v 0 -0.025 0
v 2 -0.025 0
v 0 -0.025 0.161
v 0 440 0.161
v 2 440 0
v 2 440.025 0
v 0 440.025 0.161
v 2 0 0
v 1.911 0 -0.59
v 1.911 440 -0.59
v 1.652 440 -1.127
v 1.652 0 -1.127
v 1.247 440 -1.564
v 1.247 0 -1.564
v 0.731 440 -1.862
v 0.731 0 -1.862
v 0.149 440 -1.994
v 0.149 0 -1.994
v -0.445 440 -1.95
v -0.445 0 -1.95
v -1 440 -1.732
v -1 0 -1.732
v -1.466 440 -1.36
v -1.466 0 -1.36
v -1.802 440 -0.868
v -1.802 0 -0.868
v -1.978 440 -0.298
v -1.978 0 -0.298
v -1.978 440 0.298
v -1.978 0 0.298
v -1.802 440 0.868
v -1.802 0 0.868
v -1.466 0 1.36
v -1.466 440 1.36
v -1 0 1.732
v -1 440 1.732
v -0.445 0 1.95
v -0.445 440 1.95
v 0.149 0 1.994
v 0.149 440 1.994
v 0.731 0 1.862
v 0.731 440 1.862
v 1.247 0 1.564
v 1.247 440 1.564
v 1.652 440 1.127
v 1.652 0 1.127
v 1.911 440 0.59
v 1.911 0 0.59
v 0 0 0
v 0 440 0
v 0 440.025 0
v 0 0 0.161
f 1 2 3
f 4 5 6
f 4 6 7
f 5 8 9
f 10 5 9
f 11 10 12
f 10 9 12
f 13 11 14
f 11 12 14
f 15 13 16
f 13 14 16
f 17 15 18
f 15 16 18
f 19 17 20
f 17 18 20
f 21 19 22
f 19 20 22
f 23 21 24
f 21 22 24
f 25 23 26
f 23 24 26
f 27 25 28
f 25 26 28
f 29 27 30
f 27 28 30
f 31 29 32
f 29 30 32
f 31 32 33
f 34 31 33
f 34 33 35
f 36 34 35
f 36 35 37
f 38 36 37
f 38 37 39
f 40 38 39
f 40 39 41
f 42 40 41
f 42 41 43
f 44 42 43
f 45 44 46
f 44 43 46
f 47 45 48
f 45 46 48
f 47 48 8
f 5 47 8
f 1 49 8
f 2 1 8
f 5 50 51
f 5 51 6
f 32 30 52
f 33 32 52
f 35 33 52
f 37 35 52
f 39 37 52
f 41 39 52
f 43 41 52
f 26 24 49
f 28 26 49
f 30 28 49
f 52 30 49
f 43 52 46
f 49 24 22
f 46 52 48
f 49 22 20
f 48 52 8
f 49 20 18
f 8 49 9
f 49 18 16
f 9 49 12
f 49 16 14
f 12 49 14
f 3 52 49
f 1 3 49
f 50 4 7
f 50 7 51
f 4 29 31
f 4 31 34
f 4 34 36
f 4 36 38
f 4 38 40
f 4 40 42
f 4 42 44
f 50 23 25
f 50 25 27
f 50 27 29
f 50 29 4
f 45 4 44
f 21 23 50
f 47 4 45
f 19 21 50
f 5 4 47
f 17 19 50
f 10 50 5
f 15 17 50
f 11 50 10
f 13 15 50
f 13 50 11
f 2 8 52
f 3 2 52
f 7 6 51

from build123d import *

# Parameters (mm, degrees)
SKETCH1_R           = 2
BOSS_EXTRUDE1_DEPTH = 440.000000112
BOSS_EXTRUDE2_DEPTH = 0.0254


with BuildPart() as part:
    # Sketch1 → Boss-Extrude1 (new body)
    with BuildSketch(Plane(origin=(0, 0, 0), x_dir=(1, 0, 0), z_dir=(0, 1, 0))):
        Circle(SKETCH1_R)
    extrude(amount=BOSS_EXTRUDE1_DEPTH)

    # Sketch2 → Boss-Extrude2 (add)
    with BuildSketch(Plane(origin=(0, 440.000000112, 0), x_dir=(1, 0, 0), z_dir=(0, 1, 0))):
        Polygon((0, 0), (2, 0), (0, -0.161399324), align=None)
    boss_extrude2 = extrude(amount=BOSS_EXTRUDE2_DEPTH)

    # Mirror1: Boss-Extrude2 across plane
    add(boss_extrude2.mirror(Plane.ZX.offset(220.000000056)))


solid = part.part
